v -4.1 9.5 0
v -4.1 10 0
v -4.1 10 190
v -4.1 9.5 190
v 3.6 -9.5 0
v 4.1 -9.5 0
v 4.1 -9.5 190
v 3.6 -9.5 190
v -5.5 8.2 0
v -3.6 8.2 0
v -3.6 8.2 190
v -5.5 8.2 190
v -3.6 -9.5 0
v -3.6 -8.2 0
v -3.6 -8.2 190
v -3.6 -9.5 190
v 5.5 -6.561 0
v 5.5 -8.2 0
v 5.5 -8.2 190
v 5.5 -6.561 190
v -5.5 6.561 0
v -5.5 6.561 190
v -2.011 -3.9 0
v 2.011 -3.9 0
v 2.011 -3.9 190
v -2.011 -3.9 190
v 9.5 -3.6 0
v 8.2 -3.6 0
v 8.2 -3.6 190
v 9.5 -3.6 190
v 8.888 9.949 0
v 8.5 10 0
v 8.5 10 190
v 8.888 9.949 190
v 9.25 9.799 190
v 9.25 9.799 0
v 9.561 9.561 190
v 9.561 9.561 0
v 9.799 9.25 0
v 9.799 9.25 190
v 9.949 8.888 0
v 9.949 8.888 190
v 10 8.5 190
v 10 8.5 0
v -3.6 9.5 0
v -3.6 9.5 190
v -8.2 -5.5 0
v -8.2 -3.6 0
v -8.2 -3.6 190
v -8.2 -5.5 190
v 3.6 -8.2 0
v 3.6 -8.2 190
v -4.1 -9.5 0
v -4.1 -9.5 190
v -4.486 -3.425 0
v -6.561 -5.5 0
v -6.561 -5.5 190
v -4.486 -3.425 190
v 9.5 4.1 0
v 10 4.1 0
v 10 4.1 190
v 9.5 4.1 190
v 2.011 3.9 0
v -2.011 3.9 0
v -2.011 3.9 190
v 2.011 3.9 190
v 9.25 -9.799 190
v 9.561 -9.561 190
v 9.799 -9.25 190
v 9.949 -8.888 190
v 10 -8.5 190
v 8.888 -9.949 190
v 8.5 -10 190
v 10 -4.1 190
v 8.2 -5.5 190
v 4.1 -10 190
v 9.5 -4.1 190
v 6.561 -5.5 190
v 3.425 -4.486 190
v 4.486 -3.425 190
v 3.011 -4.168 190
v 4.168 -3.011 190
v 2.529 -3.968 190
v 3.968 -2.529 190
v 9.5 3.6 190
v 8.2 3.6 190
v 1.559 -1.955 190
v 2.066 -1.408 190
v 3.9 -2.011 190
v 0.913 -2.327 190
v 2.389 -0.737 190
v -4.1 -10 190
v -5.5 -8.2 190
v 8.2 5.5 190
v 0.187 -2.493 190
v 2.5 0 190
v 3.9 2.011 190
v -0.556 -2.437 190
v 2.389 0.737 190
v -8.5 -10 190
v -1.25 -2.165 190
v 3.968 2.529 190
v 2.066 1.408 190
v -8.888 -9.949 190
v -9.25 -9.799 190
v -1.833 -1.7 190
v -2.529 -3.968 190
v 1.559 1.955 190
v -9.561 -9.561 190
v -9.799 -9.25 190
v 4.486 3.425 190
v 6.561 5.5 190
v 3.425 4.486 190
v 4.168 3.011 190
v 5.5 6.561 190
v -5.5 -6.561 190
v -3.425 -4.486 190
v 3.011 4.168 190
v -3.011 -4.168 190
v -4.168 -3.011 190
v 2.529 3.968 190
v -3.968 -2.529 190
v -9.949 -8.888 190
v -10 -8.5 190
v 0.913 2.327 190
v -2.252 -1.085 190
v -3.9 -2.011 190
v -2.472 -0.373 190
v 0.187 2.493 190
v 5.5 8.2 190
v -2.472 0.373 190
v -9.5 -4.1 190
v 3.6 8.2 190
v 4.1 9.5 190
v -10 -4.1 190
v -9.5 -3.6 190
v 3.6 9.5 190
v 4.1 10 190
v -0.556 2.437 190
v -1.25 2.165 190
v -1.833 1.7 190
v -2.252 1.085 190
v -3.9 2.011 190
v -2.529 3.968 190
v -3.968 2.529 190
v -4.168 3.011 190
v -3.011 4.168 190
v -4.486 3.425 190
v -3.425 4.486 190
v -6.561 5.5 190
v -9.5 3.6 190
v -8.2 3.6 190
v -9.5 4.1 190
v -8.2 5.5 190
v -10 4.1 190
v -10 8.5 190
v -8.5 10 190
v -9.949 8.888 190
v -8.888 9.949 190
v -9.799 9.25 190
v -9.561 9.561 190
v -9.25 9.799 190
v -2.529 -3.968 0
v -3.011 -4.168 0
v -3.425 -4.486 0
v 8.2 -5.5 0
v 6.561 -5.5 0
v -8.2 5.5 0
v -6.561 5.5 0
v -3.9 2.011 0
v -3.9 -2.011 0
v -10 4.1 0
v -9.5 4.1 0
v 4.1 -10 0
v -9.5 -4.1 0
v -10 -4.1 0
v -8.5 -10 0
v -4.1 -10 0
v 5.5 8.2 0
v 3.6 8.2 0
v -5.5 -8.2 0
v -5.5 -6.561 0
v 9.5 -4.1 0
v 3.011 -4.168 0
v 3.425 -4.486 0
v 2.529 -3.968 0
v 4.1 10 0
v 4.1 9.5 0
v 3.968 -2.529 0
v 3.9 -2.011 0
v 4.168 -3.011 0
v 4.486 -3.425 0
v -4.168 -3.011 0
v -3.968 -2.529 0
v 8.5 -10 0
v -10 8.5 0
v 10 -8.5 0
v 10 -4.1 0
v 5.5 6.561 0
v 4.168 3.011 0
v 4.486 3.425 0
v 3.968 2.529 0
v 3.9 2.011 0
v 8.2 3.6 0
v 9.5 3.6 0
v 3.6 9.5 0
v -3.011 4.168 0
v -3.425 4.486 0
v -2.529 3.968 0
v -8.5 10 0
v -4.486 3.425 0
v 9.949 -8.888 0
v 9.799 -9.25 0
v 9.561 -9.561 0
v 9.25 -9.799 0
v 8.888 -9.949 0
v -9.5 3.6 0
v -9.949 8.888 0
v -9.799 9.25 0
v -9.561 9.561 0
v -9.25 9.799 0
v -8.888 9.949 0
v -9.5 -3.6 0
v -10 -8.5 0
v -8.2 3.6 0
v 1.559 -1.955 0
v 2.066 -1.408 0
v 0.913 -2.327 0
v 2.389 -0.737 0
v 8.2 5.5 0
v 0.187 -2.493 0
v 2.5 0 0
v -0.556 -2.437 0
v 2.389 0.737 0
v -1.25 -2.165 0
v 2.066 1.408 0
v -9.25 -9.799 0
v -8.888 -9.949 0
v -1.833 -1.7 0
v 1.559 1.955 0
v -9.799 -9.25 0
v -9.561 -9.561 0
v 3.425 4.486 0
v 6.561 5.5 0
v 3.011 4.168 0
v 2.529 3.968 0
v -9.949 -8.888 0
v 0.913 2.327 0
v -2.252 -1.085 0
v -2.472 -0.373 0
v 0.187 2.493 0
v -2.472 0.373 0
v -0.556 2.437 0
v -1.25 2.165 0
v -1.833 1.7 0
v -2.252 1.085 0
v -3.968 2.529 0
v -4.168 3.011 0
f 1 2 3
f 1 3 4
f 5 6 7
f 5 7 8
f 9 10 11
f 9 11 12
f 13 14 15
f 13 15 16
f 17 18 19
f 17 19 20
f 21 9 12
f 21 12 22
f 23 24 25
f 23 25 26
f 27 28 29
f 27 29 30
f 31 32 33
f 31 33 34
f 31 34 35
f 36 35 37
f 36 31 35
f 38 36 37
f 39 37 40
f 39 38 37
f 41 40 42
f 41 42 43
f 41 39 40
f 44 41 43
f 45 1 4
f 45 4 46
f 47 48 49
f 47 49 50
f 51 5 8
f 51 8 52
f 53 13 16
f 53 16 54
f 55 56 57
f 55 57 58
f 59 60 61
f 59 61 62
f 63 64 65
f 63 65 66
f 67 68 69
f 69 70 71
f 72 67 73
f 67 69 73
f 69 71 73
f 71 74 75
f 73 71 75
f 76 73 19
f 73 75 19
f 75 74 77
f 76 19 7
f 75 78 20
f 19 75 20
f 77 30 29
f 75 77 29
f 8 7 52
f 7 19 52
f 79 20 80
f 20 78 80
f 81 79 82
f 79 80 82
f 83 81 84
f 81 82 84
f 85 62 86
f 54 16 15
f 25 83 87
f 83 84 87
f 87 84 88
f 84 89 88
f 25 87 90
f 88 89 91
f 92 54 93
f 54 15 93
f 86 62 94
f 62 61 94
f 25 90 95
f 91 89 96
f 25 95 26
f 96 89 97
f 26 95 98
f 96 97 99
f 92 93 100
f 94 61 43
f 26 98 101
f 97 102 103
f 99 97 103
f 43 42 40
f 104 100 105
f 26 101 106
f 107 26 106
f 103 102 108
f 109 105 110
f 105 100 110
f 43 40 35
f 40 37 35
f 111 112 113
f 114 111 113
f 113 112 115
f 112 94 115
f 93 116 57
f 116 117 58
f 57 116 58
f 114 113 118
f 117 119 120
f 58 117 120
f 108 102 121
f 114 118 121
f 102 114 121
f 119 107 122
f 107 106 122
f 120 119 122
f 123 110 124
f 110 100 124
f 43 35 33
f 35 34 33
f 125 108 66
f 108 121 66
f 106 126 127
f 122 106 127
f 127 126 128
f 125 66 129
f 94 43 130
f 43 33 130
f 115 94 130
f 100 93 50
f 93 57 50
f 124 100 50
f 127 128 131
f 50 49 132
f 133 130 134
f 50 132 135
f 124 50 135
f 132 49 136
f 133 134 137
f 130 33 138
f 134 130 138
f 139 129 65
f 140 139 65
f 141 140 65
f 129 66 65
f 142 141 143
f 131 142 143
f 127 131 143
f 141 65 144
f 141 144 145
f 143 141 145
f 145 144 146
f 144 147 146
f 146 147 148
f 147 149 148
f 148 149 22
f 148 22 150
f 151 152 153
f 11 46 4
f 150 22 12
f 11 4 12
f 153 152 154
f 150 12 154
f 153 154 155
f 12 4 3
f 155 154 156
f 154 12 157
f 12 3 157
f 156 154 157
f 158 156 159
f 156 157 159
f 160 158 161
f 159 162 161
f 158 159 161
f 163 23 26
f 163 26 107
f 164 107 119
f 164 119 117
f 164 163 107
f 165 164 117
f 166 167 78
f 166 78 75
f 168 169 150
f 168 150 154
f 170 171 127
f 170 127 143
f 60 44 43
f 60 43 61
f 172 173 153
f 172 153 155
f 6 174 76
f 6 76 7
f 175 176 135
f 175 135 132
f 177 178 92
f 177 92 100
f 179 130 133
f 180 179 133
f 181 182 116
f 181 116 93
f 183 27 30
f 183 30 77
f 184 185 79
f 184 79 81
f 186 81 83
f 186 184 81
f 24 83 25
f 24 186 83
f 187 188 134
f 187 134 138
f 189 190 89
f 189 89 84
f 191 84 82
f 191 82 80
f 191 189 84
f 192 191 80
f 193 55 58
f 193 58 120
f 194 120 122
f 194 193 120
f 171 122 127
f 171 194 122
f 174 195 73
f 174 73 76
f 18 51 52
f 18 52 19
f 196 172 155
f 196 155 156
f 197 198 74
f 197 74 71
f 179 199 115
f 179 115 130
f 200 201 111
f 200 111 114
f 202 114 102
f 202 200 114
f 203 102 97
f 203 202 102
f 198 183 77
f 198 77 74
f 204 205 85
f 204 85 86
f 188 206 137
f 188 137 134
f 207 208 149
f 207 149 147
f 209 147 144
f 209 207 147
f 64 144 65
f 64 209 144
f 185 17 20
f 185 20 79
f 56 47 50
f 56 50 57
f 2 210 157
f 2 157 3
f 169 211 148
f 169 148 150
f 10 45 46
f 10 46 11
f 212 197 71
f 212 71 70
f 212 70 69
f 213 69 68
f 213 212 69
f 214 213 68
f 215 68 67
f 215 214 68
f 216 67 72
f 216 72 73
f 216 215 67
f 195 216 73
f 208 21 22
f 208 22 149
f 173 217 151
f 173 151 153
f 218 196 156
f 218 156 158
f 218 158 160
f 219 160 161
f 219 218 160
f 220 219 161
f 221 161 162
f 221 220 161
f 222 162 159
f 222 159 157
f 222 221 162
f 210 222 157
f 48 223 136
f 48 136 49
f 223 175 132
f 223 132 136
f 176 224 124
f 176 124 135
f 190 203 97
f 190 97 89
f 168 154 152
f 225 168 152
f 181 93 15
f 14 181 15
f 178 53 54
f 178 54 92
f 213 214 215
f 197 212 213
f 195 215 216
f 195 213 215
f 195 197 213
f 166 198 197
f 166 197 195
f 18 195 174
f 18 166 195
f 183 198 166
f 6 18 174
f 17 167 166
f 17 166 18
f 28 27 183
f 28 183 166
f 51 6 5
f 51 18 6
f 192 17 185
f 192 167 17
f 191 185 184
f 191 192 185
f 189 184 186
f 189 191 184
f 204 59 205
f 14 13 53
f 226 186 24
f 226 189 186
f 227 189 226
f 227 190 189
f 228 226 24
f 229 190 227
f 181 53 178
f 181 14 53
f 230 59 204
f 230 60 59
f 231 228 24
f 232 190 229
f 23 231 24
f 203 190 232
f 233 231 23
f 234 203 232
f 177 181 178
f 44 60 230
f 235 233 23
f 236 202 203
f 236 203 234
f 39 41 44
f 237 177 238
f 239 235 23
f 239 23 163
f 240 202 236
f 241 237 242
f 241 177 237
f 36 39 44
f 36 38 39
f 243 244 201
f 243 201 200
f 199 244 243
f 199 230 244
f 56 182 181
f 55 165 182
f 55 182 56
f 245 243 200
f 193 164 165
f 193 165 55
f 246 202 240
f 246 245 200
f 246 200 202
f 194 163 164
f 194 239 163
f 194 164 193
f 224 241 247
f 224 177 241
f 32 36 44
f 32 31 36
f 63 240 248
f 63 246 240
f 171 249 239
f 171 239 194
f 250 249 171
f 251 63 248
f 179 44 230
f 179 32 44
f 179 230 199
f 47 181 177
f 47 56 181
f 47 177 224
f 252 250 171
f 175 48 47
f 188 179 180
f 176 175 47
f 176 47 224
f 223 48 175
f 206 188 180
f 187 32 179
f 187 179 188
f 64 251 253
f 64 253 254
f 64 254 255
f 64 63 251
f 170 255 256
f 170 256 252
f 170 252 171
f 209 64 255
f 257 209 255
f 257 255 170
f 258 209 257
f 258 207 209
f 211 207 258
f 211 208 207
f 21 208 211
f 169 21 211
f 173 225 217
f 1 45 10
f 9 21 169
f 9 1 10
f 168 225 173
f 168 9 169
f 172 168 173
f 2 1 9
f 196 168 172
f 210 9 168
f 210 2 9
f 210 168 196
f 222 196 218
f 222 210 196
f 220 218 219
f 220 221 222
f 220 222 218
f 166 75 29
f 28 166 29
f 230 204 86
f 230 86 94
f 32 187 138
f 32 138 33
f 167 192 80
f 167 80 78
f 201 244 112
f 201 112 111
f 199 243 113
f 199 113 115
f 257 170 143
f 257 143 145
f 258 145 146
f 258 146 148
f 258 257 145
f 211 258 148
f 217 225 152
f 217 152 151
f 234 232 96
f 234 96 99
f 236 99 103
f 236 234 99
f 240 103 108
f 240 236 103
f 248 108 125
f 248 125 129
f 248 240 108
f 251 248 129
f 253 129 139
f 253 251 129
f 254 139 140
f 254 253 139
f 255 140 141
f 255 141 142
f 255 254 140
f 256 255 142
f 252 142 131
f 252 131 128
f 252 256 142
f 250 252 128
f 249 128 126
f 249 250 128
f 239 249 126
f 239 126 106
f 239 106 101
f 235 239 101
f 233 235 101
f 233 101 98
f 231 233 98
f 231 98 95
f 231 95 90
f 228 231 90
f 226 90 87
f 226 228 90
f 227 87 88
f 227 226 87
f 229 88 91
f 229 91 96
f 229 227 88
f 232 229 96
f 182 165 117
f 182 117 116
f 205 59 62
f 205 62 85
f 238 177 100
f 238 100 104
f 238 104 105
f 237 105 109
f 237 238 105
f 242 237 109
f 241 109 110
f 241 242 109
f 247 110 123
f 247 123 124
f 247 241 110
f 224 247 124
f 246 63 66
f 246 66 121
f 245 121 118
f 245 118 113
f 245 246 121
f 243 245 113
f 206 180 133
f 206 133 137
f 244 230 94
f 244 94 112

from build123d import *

# Parameters (mm, degrees)
SKETCH1_R           = 2.5
BOSS_EXTRUDE2_DEPTH = 190


with BuildPart() as part:
    # Sketch1 → Boss-Extrude2 (new body)
    with BuildSketch(Plane.XY):
        with BuildLine():
            Line((10, -4.1), (10, -8.5))
            ThreePointArc((10, -8.5), (9.560660172, -9.560660172), (8.5, -10))
            Line((8.5, -10), (4.1, -10))
            Line((4.1, -10), (4.1, -9.5))
            Line((4.1, -9.5), (3.6, -9.5))
            Line((3.6, -9.5), (3.6, -8.2))
            Line((3.6, -8.2), (5.5, -8.2))
            Line((5.5, -8.2), (5.5, -6.560660172))
            Line((5.5, -6.560660172), (3.425126266, -4.485786438))
            ThreePointArc((3.425126266, -4.485786438), (2.776279568, -4.052240935), (2.010912703, -3.9))
            Line((2.010912703, -3.9), (-2.010912703, -3.9))
            ThreePointArc((-2.010912703, -3.9), (-2.776279568, -4.052240935), (-3.425126266, -4.485786438))
            Line((-3.425126266, -4.485786438), (-5.5, -6.560660172))
            Line((-5.5, -6.560660172), (-5.5, -8.2))
            Line((-5.5, -8.2), (-3.6, -8.2))
            Line((-3.6, -8.2), (-3.6, -9.5))
            Line((-3.6, -9.5), (-4.1, -9.5))
            Line((-4.1, -9.5), (-4.1, -10))
            Line((-4.1, -10), (-8.5, -10))
            ThreePointArc((-8.5, -10), (-9.560660172, -9.560660172), (-10, -8.5))
            Line((-10, -8.5), (-10, -4.1))
            Line((-10, -4.1), (-9.5, -4.1))
            Line((-9.5, -4.1), (-9.5, -3.6))
            Line((-9.5, -3.6), (-8.2, -3.6))
            Line((-8.2, -3.6), (-8.2, -5.5))
            Line((-8.2, -5.5), (-6.560660172, -5.5))
            Line((-6.560660172, -5.5), (-4.485786438, -3.425126266))
            ThreePointArc((-4.485786438, -3.425126266), (-4.052240935, -2.776279568), (-3.9, -2.010912703))
            Line((-3.9, -2.010912703), (-3.9, 2.010912703))
            ThreePointArc((-3.9, 2.010912703), (-4.052240935, 2.776279568), (-4.485786438, 3.425126266))
            Line((-4.485786438, 3.425126266), (-6.560660172, 5.5))
            Line((-6.560660172, 5.5), (-8.2, 5.5))
            Line((-8.2, 5.5), (-8.2, 3.6))
            Line((-8.2, 3.6), (-9.5, 3.6))
            Line((-9.5, 3.6), (-9.5, 4.1))
            Line((-9.5, 4.1), (-10, 4.1))
            Line((-10, 4.1), (-10, 8.5))
            ThreePointArc((-10, 8.5), (-9.560660172, 9.560660172), (-8.5, 10))
            Line((-8.5, 10), (-4.1, 10))
            Line((-4.1, 10), (-4.1, 9.5))
            Line((-4.1, 9.5), (-3.6, 9.5))
            Line((-3.6, 9.5), (-3.6, 8.2))
            Line((-3.6, 8.2), (-5.5, 8.2))
            Line((-5.5, 8.2), (-5.5, 6.560660172))
            Line((-5.5, 6.560660172), (-3.425126266, 4.485786438))
            ThreePointArc((-3.425126266, 4.485786438), (-2.776279568, 4.052240935), (-2.010912703, 3.9))
            Line((-2.010912703, 3.9), (2.010912703, 3.9))
            ThreePointArc((2.010912703, 3.9), (2.776279568, 4.052240935), (3.425126266, 4.485786438))
            Line((3.425126266, 4.485786438), (5.5, 6.560660172))
            Line((5.5, 6.560660172), (5.5, 8.2))
            Line((5.5, 8.2), (3.6, 8.2))
            Line((3.6, 8.2), (3.6, 9.5))
            Line((3.6, 9.5), (4.1, 9.5))
            Line((4.1, 9.5), (4.1, 10))
            Line((4.1, 10), (8.5, 10))
            ThreePointArc((8.5, 10), (9.560660172, 9.560660172), (10, 8.5))
            Line((10, 8.5), (10, 4.1))
            Line((10, 4.1), (9.5, 4.1))
            Line((9.5, 4.1), (9.5, 3.6))
            Line((9.5, 3.6), (8.2, 3.6))
            Line((8.2, 3.6), (8.2, 5.5))
            Line((8.2, 5.5), (6.560660172, 5.5))
            Line((6.560660172, 5.5), (4.485786438, 3.425126266))
            ThreePointArc((4.485786438, 3.425126266), (4.052240935, 2.776279568), (3.9, 2.010912703))
            Line((3.9, 2.010912703), (3.9, -2.010912703))
            ThreePointArc((3.9, -2.010912703), (4.052240935, -2.776279568), (4.485786438, -3.425126266))
            Line((4.485786438, -3.425126266), (6.560660172, -5.5))
            Line((6.560660172, -5.5), (8.2, -5.5))
            Line((8.2, -5.5), (8.2, -3.6))
            Line((8.2, -3.6), (9.5, -3.6))
            Line((9.5, -3.6), (9.5, -4.1))
            Line((9.5, -4.1), (10, -4.1))
        make_face()
        Circle(SKETCH1_R, mode=Mode.SUBTRACT)
    extrude(amount=BOSS_EXTRUDE2_DEPTH)


solid = part.part
